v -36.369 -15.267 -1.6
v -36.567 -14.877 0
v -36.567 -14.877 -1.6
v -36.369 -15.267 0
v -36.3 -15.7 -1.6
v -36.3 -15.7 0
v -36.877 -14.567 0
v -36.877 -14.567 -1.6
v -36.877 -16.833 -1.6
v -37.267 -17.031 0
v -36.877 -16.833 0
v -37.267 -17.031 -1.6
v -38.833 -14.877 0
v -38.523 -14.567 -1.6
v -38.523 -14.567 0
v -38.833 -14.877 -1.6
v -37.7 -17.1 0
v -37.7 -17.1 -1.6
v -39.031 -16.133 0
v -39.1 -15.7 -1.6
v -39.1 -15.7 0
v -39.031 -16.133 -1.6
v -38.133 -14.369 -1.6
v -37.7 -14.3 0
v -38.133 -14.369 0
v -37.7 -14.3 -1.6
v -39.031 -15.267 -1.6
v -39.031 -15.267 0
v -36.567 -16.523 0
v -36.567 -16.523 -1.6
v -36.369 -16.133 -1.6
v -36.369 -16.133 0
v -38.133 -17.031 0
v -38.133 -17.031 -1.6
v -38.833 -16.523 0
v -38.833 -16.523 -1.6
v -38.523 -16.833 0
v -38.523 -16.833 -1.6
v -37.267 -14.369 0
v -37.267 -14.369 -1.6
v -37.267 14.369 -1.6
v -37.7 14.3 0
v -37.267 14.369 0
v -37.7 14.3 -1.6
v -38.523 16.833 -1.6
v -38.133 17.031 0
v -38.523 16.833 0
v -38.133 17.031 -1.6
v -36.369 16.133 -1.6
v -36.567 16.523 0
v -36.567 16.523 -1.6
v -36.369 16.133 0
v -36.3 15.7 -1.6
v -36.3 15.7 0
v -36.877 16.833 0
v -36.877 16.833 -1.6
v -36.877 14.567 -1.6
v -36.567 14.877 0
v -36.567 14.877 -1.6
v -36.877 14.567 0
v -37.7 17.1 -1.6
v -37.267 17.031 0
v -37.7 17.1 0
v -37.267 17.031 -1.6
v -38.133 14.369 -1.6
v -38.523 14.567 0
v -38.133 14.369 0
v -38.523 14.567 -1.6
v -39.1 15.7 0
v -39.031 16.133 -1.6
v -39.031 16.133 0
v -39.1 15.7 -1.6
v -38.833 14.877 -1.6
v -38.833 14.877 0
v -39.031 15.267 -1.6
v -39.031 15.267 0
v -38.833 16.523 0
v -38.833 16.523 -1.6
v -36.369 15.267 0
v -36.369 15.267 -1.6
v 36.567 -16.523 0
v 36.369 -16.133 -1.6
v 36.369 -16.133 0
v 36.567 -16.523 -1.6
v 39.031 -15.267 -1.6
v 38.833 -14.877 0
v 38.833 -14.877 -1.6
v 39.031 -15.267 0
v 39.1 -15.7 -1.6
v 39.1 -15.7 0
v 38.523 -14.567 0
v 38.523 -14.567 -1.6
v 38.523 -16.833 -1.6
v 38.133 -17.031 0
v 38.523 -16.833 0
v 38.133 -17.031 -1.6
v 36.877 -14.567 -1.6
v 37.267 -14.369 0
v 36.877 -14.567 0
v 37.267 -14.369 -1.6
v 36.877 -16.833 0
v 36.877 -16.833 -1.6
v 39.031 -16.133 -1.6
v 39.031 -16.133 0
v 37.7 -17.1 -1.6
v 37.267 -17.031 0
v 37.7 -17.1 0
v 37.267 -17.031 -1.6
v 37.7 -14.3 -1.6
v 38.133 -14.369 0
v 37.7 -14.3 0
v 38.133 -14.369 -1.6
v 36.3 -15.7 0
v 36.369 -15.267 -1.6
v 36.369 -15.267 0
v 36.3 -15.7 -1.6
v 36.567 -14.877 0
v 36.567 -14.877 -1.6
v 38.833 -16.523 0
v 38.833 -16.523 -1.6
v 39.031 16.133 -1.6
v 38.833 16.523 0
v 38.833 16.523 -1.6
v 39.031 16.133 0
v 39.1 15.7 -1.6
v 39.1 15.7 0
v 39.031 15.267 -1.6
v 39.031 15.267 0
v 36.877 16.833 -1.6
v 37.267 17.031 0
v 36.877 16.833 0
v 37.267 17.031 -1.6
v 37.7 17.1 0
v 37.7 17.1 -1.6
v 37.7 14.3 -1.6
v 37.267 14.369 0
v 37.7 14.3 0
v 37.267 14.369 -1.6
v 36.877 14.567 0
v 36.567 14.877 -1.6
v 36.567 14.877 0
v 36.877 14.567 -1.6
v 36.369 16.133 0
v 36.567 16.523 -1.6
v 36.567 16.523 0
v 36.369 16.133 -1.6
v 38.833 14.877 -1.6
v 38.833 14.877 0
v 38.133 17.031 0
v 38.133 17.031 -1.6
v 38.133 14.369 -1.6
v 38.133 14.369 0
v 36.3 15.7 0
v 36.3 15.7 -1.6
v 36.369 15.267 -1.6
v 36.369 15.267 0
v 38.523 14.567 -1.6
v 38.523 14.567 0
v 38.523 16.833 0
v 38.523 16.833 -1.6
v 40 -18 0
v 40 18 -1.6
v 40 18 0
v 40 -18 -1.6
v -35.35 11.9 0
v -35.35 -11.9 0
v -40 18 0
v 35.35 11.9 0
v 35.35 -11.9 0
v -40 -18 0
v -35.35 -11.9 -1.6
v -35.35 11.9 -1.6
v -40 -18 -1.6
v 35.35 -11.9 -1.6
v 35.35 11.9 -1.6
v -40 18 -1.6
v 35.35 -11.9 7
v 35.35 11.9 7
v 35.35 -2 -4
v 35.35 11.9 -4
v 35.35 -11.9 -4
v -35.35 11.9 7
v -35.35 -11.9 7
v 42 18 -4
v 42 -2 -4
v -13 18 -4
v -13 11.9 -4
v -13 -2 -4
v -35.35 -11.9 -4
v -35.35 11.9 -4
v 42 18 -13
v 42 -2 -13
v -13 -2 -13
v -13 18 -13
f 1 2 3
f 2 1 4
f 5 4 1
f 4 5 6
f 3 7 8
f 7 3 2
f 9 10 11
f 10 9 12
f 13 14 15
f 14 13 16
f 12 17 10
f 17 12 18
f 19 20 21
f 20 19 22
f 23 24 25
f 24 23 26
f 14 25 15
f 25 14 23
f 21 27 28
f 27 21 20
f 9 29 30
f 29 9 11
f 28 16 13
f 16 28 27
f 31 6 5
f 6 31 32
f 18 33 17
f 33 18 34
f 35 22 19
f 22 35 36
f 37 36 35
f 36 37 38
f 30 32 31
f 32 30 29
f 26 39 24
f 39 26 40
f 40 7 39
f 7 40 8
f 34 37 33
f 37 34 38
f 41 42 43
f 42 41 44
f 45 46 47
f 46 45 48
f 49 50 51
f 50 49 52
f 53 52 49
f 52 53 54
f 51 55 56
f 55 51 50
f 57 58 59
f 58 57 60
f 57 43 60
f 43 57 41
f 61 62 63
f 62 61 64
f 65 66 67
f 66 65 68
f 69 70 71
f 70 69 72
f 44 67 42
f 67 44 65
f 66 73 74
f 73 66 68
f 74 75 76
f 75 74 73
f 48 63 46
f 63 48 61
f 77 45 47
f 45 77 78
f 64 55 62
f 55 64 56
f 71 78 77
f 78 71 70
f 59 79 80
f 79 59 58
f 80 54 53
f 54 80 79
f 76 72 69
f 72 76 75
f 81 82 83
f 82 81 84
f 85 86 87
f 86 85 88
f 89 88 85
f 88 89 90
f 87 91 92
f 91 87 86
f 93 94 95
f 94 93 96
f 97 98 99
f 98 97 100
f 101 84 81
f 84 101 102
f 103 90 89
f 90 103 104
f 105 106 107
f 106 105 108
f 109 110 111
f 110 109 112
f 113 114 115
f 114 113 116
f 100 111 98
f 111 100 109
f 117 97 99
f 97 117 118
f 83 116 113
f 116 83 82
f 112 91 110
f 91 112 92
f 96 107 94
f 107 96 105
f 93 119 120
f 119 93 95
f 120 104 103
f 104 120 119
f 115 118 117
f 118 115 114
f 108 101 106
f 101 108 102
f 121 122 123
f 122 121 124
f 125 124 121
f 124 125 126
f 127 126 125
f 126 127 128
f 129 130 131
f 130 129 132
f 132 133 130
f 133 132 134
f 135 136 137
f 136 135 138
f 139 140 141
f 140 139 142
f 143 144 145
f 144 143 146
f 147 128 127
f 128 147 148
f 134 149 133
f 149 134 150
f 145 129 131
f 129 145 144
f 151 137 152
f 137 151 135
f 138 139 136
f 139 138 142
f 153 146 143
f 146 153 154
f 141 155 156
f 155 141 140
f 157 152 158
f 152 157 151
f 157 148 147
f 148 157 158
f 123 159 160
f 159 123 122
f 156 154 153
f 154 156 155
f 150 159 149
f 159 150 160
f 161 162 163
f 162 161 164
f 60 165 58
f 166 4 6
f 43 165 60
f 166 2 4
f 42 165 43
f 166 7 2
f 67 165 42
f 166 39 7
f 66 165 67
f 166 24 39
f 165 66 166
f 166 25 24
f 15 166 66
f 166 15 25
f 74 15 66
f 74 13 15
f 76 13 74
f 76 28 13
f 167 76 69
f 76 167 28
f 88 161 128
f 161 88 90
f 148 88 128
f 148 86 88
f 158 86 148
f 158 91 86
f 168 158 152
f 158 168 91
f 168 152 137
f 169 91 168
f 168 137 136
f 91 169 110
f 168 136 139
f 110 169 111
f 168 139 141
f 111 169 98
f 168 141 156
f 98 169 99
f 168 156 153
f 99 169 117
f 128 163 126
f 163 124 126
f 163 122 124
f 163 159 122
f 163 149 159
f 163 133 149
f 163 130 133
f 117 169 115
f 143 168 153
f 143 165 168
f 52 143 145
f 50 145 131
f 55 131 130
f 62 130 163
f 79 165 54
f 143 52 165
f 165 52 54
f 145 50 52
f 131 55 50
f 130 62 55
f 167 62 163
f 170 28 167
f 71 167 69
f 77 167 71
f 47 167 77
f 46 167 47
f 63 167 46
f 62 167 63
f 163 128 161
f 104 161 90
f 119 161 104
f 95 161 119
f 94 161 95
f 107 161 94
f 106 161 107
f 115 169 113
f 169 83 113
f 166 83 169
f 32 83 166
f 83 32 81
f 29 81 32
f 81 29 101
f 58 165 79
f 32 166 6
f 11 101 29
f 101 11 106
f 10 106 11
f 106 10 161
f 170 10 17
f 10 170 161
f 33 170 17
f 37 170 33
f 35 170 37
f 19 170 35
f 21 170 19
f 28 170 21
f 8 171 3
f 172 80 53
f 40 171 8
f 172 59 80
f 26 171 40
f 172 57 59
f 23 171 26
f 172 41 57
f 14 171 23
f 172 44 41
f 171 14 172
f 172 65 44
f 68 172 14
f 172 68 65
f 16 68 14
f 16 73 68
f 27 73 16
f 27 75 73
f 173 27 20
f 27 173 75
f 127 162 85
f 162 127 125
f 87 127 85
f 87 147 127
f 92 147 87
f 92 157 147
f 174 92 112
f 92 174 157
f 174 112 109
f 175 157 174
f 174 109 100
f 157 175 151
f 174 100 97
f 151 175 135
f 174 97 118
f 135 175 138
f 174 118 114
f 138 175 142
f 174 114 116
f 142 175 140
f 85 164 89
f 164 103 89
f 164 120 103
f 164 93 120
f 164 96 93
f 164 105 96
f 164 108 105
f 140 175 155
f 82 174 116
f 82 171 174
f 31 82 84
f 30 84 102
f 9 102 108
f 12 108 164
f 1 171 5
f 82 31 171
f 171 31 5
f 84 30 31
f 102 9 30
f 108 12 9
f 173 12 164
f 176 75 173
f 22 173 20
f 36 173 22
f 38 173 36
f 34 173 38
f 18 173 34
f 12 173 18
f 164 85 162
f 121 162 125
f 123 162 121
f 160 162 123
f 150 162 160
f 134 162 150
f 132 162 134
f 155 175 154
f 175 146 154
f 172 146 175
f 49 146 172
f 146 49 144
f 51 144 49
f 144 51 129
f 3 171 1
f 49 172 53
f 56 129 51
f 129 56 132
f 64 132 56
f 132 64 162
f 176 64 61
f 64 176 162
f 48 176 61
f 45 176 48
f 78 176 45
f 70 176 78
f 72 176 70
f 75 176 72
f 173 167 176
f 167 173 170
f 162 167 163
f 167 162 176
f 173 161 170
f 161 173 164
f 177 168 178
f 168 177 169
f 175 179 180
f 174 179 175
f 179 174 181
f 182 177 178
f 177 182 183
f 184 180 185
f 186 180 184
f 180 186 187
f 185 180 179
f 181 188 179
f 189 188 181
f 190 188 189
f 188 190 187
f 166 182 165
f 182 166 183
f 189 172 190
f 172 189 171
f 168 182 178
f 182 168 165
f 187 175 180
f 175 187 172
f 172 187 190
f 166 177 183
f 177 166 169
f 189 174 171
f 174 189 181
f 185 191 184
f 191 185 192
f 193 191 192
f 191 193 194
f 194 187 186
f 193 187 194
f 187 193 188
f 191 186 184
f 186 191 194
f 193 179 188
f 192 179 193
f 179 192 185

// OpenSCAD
module LCDScreenBoreHoles() {
    for (x = [-75.4/2, 75.4/2])
        for (y = [-31.4/2, 31.4/2])
            translate([x, y, 0])        
                children();
}


module LCDScreen() {
    
    color("blue") {

        translate([-70.7/2, -23.8/2, 7-11])
        cube([70.7, 23.8, 11]);

        difference() {

            translate([-80/2, -36/2, -1.6])
            cube([80, 36, 1.6]);
            
            LCDScreenBoreHoles()
            translate([0, 0, -5])        
                cylinder($fn=20, d = 2.8, h = 10);
        }

        translate([-13, -2, 7-11-9])
        cube([55, 20, 9]);
        
    }
    
};


module LCDScreenCutout(clearence = 0.2) {
    clearence_screen = clearence*2;
    translate([-70.7/2 - clearence_screen, -23.8/2 - clearence_screen, 7-11])
    cube([70.7 + clearence_screen*2, 23.8 + clearence_screen*2, 11]);

    LCDScreenBoreHoles()
    translate([0, 0, -5])        
            cylinder($fn=40, d = 2.8 + clearence*2, h = 20);
};

LCDScreen();
//LCDScreenCutout();
